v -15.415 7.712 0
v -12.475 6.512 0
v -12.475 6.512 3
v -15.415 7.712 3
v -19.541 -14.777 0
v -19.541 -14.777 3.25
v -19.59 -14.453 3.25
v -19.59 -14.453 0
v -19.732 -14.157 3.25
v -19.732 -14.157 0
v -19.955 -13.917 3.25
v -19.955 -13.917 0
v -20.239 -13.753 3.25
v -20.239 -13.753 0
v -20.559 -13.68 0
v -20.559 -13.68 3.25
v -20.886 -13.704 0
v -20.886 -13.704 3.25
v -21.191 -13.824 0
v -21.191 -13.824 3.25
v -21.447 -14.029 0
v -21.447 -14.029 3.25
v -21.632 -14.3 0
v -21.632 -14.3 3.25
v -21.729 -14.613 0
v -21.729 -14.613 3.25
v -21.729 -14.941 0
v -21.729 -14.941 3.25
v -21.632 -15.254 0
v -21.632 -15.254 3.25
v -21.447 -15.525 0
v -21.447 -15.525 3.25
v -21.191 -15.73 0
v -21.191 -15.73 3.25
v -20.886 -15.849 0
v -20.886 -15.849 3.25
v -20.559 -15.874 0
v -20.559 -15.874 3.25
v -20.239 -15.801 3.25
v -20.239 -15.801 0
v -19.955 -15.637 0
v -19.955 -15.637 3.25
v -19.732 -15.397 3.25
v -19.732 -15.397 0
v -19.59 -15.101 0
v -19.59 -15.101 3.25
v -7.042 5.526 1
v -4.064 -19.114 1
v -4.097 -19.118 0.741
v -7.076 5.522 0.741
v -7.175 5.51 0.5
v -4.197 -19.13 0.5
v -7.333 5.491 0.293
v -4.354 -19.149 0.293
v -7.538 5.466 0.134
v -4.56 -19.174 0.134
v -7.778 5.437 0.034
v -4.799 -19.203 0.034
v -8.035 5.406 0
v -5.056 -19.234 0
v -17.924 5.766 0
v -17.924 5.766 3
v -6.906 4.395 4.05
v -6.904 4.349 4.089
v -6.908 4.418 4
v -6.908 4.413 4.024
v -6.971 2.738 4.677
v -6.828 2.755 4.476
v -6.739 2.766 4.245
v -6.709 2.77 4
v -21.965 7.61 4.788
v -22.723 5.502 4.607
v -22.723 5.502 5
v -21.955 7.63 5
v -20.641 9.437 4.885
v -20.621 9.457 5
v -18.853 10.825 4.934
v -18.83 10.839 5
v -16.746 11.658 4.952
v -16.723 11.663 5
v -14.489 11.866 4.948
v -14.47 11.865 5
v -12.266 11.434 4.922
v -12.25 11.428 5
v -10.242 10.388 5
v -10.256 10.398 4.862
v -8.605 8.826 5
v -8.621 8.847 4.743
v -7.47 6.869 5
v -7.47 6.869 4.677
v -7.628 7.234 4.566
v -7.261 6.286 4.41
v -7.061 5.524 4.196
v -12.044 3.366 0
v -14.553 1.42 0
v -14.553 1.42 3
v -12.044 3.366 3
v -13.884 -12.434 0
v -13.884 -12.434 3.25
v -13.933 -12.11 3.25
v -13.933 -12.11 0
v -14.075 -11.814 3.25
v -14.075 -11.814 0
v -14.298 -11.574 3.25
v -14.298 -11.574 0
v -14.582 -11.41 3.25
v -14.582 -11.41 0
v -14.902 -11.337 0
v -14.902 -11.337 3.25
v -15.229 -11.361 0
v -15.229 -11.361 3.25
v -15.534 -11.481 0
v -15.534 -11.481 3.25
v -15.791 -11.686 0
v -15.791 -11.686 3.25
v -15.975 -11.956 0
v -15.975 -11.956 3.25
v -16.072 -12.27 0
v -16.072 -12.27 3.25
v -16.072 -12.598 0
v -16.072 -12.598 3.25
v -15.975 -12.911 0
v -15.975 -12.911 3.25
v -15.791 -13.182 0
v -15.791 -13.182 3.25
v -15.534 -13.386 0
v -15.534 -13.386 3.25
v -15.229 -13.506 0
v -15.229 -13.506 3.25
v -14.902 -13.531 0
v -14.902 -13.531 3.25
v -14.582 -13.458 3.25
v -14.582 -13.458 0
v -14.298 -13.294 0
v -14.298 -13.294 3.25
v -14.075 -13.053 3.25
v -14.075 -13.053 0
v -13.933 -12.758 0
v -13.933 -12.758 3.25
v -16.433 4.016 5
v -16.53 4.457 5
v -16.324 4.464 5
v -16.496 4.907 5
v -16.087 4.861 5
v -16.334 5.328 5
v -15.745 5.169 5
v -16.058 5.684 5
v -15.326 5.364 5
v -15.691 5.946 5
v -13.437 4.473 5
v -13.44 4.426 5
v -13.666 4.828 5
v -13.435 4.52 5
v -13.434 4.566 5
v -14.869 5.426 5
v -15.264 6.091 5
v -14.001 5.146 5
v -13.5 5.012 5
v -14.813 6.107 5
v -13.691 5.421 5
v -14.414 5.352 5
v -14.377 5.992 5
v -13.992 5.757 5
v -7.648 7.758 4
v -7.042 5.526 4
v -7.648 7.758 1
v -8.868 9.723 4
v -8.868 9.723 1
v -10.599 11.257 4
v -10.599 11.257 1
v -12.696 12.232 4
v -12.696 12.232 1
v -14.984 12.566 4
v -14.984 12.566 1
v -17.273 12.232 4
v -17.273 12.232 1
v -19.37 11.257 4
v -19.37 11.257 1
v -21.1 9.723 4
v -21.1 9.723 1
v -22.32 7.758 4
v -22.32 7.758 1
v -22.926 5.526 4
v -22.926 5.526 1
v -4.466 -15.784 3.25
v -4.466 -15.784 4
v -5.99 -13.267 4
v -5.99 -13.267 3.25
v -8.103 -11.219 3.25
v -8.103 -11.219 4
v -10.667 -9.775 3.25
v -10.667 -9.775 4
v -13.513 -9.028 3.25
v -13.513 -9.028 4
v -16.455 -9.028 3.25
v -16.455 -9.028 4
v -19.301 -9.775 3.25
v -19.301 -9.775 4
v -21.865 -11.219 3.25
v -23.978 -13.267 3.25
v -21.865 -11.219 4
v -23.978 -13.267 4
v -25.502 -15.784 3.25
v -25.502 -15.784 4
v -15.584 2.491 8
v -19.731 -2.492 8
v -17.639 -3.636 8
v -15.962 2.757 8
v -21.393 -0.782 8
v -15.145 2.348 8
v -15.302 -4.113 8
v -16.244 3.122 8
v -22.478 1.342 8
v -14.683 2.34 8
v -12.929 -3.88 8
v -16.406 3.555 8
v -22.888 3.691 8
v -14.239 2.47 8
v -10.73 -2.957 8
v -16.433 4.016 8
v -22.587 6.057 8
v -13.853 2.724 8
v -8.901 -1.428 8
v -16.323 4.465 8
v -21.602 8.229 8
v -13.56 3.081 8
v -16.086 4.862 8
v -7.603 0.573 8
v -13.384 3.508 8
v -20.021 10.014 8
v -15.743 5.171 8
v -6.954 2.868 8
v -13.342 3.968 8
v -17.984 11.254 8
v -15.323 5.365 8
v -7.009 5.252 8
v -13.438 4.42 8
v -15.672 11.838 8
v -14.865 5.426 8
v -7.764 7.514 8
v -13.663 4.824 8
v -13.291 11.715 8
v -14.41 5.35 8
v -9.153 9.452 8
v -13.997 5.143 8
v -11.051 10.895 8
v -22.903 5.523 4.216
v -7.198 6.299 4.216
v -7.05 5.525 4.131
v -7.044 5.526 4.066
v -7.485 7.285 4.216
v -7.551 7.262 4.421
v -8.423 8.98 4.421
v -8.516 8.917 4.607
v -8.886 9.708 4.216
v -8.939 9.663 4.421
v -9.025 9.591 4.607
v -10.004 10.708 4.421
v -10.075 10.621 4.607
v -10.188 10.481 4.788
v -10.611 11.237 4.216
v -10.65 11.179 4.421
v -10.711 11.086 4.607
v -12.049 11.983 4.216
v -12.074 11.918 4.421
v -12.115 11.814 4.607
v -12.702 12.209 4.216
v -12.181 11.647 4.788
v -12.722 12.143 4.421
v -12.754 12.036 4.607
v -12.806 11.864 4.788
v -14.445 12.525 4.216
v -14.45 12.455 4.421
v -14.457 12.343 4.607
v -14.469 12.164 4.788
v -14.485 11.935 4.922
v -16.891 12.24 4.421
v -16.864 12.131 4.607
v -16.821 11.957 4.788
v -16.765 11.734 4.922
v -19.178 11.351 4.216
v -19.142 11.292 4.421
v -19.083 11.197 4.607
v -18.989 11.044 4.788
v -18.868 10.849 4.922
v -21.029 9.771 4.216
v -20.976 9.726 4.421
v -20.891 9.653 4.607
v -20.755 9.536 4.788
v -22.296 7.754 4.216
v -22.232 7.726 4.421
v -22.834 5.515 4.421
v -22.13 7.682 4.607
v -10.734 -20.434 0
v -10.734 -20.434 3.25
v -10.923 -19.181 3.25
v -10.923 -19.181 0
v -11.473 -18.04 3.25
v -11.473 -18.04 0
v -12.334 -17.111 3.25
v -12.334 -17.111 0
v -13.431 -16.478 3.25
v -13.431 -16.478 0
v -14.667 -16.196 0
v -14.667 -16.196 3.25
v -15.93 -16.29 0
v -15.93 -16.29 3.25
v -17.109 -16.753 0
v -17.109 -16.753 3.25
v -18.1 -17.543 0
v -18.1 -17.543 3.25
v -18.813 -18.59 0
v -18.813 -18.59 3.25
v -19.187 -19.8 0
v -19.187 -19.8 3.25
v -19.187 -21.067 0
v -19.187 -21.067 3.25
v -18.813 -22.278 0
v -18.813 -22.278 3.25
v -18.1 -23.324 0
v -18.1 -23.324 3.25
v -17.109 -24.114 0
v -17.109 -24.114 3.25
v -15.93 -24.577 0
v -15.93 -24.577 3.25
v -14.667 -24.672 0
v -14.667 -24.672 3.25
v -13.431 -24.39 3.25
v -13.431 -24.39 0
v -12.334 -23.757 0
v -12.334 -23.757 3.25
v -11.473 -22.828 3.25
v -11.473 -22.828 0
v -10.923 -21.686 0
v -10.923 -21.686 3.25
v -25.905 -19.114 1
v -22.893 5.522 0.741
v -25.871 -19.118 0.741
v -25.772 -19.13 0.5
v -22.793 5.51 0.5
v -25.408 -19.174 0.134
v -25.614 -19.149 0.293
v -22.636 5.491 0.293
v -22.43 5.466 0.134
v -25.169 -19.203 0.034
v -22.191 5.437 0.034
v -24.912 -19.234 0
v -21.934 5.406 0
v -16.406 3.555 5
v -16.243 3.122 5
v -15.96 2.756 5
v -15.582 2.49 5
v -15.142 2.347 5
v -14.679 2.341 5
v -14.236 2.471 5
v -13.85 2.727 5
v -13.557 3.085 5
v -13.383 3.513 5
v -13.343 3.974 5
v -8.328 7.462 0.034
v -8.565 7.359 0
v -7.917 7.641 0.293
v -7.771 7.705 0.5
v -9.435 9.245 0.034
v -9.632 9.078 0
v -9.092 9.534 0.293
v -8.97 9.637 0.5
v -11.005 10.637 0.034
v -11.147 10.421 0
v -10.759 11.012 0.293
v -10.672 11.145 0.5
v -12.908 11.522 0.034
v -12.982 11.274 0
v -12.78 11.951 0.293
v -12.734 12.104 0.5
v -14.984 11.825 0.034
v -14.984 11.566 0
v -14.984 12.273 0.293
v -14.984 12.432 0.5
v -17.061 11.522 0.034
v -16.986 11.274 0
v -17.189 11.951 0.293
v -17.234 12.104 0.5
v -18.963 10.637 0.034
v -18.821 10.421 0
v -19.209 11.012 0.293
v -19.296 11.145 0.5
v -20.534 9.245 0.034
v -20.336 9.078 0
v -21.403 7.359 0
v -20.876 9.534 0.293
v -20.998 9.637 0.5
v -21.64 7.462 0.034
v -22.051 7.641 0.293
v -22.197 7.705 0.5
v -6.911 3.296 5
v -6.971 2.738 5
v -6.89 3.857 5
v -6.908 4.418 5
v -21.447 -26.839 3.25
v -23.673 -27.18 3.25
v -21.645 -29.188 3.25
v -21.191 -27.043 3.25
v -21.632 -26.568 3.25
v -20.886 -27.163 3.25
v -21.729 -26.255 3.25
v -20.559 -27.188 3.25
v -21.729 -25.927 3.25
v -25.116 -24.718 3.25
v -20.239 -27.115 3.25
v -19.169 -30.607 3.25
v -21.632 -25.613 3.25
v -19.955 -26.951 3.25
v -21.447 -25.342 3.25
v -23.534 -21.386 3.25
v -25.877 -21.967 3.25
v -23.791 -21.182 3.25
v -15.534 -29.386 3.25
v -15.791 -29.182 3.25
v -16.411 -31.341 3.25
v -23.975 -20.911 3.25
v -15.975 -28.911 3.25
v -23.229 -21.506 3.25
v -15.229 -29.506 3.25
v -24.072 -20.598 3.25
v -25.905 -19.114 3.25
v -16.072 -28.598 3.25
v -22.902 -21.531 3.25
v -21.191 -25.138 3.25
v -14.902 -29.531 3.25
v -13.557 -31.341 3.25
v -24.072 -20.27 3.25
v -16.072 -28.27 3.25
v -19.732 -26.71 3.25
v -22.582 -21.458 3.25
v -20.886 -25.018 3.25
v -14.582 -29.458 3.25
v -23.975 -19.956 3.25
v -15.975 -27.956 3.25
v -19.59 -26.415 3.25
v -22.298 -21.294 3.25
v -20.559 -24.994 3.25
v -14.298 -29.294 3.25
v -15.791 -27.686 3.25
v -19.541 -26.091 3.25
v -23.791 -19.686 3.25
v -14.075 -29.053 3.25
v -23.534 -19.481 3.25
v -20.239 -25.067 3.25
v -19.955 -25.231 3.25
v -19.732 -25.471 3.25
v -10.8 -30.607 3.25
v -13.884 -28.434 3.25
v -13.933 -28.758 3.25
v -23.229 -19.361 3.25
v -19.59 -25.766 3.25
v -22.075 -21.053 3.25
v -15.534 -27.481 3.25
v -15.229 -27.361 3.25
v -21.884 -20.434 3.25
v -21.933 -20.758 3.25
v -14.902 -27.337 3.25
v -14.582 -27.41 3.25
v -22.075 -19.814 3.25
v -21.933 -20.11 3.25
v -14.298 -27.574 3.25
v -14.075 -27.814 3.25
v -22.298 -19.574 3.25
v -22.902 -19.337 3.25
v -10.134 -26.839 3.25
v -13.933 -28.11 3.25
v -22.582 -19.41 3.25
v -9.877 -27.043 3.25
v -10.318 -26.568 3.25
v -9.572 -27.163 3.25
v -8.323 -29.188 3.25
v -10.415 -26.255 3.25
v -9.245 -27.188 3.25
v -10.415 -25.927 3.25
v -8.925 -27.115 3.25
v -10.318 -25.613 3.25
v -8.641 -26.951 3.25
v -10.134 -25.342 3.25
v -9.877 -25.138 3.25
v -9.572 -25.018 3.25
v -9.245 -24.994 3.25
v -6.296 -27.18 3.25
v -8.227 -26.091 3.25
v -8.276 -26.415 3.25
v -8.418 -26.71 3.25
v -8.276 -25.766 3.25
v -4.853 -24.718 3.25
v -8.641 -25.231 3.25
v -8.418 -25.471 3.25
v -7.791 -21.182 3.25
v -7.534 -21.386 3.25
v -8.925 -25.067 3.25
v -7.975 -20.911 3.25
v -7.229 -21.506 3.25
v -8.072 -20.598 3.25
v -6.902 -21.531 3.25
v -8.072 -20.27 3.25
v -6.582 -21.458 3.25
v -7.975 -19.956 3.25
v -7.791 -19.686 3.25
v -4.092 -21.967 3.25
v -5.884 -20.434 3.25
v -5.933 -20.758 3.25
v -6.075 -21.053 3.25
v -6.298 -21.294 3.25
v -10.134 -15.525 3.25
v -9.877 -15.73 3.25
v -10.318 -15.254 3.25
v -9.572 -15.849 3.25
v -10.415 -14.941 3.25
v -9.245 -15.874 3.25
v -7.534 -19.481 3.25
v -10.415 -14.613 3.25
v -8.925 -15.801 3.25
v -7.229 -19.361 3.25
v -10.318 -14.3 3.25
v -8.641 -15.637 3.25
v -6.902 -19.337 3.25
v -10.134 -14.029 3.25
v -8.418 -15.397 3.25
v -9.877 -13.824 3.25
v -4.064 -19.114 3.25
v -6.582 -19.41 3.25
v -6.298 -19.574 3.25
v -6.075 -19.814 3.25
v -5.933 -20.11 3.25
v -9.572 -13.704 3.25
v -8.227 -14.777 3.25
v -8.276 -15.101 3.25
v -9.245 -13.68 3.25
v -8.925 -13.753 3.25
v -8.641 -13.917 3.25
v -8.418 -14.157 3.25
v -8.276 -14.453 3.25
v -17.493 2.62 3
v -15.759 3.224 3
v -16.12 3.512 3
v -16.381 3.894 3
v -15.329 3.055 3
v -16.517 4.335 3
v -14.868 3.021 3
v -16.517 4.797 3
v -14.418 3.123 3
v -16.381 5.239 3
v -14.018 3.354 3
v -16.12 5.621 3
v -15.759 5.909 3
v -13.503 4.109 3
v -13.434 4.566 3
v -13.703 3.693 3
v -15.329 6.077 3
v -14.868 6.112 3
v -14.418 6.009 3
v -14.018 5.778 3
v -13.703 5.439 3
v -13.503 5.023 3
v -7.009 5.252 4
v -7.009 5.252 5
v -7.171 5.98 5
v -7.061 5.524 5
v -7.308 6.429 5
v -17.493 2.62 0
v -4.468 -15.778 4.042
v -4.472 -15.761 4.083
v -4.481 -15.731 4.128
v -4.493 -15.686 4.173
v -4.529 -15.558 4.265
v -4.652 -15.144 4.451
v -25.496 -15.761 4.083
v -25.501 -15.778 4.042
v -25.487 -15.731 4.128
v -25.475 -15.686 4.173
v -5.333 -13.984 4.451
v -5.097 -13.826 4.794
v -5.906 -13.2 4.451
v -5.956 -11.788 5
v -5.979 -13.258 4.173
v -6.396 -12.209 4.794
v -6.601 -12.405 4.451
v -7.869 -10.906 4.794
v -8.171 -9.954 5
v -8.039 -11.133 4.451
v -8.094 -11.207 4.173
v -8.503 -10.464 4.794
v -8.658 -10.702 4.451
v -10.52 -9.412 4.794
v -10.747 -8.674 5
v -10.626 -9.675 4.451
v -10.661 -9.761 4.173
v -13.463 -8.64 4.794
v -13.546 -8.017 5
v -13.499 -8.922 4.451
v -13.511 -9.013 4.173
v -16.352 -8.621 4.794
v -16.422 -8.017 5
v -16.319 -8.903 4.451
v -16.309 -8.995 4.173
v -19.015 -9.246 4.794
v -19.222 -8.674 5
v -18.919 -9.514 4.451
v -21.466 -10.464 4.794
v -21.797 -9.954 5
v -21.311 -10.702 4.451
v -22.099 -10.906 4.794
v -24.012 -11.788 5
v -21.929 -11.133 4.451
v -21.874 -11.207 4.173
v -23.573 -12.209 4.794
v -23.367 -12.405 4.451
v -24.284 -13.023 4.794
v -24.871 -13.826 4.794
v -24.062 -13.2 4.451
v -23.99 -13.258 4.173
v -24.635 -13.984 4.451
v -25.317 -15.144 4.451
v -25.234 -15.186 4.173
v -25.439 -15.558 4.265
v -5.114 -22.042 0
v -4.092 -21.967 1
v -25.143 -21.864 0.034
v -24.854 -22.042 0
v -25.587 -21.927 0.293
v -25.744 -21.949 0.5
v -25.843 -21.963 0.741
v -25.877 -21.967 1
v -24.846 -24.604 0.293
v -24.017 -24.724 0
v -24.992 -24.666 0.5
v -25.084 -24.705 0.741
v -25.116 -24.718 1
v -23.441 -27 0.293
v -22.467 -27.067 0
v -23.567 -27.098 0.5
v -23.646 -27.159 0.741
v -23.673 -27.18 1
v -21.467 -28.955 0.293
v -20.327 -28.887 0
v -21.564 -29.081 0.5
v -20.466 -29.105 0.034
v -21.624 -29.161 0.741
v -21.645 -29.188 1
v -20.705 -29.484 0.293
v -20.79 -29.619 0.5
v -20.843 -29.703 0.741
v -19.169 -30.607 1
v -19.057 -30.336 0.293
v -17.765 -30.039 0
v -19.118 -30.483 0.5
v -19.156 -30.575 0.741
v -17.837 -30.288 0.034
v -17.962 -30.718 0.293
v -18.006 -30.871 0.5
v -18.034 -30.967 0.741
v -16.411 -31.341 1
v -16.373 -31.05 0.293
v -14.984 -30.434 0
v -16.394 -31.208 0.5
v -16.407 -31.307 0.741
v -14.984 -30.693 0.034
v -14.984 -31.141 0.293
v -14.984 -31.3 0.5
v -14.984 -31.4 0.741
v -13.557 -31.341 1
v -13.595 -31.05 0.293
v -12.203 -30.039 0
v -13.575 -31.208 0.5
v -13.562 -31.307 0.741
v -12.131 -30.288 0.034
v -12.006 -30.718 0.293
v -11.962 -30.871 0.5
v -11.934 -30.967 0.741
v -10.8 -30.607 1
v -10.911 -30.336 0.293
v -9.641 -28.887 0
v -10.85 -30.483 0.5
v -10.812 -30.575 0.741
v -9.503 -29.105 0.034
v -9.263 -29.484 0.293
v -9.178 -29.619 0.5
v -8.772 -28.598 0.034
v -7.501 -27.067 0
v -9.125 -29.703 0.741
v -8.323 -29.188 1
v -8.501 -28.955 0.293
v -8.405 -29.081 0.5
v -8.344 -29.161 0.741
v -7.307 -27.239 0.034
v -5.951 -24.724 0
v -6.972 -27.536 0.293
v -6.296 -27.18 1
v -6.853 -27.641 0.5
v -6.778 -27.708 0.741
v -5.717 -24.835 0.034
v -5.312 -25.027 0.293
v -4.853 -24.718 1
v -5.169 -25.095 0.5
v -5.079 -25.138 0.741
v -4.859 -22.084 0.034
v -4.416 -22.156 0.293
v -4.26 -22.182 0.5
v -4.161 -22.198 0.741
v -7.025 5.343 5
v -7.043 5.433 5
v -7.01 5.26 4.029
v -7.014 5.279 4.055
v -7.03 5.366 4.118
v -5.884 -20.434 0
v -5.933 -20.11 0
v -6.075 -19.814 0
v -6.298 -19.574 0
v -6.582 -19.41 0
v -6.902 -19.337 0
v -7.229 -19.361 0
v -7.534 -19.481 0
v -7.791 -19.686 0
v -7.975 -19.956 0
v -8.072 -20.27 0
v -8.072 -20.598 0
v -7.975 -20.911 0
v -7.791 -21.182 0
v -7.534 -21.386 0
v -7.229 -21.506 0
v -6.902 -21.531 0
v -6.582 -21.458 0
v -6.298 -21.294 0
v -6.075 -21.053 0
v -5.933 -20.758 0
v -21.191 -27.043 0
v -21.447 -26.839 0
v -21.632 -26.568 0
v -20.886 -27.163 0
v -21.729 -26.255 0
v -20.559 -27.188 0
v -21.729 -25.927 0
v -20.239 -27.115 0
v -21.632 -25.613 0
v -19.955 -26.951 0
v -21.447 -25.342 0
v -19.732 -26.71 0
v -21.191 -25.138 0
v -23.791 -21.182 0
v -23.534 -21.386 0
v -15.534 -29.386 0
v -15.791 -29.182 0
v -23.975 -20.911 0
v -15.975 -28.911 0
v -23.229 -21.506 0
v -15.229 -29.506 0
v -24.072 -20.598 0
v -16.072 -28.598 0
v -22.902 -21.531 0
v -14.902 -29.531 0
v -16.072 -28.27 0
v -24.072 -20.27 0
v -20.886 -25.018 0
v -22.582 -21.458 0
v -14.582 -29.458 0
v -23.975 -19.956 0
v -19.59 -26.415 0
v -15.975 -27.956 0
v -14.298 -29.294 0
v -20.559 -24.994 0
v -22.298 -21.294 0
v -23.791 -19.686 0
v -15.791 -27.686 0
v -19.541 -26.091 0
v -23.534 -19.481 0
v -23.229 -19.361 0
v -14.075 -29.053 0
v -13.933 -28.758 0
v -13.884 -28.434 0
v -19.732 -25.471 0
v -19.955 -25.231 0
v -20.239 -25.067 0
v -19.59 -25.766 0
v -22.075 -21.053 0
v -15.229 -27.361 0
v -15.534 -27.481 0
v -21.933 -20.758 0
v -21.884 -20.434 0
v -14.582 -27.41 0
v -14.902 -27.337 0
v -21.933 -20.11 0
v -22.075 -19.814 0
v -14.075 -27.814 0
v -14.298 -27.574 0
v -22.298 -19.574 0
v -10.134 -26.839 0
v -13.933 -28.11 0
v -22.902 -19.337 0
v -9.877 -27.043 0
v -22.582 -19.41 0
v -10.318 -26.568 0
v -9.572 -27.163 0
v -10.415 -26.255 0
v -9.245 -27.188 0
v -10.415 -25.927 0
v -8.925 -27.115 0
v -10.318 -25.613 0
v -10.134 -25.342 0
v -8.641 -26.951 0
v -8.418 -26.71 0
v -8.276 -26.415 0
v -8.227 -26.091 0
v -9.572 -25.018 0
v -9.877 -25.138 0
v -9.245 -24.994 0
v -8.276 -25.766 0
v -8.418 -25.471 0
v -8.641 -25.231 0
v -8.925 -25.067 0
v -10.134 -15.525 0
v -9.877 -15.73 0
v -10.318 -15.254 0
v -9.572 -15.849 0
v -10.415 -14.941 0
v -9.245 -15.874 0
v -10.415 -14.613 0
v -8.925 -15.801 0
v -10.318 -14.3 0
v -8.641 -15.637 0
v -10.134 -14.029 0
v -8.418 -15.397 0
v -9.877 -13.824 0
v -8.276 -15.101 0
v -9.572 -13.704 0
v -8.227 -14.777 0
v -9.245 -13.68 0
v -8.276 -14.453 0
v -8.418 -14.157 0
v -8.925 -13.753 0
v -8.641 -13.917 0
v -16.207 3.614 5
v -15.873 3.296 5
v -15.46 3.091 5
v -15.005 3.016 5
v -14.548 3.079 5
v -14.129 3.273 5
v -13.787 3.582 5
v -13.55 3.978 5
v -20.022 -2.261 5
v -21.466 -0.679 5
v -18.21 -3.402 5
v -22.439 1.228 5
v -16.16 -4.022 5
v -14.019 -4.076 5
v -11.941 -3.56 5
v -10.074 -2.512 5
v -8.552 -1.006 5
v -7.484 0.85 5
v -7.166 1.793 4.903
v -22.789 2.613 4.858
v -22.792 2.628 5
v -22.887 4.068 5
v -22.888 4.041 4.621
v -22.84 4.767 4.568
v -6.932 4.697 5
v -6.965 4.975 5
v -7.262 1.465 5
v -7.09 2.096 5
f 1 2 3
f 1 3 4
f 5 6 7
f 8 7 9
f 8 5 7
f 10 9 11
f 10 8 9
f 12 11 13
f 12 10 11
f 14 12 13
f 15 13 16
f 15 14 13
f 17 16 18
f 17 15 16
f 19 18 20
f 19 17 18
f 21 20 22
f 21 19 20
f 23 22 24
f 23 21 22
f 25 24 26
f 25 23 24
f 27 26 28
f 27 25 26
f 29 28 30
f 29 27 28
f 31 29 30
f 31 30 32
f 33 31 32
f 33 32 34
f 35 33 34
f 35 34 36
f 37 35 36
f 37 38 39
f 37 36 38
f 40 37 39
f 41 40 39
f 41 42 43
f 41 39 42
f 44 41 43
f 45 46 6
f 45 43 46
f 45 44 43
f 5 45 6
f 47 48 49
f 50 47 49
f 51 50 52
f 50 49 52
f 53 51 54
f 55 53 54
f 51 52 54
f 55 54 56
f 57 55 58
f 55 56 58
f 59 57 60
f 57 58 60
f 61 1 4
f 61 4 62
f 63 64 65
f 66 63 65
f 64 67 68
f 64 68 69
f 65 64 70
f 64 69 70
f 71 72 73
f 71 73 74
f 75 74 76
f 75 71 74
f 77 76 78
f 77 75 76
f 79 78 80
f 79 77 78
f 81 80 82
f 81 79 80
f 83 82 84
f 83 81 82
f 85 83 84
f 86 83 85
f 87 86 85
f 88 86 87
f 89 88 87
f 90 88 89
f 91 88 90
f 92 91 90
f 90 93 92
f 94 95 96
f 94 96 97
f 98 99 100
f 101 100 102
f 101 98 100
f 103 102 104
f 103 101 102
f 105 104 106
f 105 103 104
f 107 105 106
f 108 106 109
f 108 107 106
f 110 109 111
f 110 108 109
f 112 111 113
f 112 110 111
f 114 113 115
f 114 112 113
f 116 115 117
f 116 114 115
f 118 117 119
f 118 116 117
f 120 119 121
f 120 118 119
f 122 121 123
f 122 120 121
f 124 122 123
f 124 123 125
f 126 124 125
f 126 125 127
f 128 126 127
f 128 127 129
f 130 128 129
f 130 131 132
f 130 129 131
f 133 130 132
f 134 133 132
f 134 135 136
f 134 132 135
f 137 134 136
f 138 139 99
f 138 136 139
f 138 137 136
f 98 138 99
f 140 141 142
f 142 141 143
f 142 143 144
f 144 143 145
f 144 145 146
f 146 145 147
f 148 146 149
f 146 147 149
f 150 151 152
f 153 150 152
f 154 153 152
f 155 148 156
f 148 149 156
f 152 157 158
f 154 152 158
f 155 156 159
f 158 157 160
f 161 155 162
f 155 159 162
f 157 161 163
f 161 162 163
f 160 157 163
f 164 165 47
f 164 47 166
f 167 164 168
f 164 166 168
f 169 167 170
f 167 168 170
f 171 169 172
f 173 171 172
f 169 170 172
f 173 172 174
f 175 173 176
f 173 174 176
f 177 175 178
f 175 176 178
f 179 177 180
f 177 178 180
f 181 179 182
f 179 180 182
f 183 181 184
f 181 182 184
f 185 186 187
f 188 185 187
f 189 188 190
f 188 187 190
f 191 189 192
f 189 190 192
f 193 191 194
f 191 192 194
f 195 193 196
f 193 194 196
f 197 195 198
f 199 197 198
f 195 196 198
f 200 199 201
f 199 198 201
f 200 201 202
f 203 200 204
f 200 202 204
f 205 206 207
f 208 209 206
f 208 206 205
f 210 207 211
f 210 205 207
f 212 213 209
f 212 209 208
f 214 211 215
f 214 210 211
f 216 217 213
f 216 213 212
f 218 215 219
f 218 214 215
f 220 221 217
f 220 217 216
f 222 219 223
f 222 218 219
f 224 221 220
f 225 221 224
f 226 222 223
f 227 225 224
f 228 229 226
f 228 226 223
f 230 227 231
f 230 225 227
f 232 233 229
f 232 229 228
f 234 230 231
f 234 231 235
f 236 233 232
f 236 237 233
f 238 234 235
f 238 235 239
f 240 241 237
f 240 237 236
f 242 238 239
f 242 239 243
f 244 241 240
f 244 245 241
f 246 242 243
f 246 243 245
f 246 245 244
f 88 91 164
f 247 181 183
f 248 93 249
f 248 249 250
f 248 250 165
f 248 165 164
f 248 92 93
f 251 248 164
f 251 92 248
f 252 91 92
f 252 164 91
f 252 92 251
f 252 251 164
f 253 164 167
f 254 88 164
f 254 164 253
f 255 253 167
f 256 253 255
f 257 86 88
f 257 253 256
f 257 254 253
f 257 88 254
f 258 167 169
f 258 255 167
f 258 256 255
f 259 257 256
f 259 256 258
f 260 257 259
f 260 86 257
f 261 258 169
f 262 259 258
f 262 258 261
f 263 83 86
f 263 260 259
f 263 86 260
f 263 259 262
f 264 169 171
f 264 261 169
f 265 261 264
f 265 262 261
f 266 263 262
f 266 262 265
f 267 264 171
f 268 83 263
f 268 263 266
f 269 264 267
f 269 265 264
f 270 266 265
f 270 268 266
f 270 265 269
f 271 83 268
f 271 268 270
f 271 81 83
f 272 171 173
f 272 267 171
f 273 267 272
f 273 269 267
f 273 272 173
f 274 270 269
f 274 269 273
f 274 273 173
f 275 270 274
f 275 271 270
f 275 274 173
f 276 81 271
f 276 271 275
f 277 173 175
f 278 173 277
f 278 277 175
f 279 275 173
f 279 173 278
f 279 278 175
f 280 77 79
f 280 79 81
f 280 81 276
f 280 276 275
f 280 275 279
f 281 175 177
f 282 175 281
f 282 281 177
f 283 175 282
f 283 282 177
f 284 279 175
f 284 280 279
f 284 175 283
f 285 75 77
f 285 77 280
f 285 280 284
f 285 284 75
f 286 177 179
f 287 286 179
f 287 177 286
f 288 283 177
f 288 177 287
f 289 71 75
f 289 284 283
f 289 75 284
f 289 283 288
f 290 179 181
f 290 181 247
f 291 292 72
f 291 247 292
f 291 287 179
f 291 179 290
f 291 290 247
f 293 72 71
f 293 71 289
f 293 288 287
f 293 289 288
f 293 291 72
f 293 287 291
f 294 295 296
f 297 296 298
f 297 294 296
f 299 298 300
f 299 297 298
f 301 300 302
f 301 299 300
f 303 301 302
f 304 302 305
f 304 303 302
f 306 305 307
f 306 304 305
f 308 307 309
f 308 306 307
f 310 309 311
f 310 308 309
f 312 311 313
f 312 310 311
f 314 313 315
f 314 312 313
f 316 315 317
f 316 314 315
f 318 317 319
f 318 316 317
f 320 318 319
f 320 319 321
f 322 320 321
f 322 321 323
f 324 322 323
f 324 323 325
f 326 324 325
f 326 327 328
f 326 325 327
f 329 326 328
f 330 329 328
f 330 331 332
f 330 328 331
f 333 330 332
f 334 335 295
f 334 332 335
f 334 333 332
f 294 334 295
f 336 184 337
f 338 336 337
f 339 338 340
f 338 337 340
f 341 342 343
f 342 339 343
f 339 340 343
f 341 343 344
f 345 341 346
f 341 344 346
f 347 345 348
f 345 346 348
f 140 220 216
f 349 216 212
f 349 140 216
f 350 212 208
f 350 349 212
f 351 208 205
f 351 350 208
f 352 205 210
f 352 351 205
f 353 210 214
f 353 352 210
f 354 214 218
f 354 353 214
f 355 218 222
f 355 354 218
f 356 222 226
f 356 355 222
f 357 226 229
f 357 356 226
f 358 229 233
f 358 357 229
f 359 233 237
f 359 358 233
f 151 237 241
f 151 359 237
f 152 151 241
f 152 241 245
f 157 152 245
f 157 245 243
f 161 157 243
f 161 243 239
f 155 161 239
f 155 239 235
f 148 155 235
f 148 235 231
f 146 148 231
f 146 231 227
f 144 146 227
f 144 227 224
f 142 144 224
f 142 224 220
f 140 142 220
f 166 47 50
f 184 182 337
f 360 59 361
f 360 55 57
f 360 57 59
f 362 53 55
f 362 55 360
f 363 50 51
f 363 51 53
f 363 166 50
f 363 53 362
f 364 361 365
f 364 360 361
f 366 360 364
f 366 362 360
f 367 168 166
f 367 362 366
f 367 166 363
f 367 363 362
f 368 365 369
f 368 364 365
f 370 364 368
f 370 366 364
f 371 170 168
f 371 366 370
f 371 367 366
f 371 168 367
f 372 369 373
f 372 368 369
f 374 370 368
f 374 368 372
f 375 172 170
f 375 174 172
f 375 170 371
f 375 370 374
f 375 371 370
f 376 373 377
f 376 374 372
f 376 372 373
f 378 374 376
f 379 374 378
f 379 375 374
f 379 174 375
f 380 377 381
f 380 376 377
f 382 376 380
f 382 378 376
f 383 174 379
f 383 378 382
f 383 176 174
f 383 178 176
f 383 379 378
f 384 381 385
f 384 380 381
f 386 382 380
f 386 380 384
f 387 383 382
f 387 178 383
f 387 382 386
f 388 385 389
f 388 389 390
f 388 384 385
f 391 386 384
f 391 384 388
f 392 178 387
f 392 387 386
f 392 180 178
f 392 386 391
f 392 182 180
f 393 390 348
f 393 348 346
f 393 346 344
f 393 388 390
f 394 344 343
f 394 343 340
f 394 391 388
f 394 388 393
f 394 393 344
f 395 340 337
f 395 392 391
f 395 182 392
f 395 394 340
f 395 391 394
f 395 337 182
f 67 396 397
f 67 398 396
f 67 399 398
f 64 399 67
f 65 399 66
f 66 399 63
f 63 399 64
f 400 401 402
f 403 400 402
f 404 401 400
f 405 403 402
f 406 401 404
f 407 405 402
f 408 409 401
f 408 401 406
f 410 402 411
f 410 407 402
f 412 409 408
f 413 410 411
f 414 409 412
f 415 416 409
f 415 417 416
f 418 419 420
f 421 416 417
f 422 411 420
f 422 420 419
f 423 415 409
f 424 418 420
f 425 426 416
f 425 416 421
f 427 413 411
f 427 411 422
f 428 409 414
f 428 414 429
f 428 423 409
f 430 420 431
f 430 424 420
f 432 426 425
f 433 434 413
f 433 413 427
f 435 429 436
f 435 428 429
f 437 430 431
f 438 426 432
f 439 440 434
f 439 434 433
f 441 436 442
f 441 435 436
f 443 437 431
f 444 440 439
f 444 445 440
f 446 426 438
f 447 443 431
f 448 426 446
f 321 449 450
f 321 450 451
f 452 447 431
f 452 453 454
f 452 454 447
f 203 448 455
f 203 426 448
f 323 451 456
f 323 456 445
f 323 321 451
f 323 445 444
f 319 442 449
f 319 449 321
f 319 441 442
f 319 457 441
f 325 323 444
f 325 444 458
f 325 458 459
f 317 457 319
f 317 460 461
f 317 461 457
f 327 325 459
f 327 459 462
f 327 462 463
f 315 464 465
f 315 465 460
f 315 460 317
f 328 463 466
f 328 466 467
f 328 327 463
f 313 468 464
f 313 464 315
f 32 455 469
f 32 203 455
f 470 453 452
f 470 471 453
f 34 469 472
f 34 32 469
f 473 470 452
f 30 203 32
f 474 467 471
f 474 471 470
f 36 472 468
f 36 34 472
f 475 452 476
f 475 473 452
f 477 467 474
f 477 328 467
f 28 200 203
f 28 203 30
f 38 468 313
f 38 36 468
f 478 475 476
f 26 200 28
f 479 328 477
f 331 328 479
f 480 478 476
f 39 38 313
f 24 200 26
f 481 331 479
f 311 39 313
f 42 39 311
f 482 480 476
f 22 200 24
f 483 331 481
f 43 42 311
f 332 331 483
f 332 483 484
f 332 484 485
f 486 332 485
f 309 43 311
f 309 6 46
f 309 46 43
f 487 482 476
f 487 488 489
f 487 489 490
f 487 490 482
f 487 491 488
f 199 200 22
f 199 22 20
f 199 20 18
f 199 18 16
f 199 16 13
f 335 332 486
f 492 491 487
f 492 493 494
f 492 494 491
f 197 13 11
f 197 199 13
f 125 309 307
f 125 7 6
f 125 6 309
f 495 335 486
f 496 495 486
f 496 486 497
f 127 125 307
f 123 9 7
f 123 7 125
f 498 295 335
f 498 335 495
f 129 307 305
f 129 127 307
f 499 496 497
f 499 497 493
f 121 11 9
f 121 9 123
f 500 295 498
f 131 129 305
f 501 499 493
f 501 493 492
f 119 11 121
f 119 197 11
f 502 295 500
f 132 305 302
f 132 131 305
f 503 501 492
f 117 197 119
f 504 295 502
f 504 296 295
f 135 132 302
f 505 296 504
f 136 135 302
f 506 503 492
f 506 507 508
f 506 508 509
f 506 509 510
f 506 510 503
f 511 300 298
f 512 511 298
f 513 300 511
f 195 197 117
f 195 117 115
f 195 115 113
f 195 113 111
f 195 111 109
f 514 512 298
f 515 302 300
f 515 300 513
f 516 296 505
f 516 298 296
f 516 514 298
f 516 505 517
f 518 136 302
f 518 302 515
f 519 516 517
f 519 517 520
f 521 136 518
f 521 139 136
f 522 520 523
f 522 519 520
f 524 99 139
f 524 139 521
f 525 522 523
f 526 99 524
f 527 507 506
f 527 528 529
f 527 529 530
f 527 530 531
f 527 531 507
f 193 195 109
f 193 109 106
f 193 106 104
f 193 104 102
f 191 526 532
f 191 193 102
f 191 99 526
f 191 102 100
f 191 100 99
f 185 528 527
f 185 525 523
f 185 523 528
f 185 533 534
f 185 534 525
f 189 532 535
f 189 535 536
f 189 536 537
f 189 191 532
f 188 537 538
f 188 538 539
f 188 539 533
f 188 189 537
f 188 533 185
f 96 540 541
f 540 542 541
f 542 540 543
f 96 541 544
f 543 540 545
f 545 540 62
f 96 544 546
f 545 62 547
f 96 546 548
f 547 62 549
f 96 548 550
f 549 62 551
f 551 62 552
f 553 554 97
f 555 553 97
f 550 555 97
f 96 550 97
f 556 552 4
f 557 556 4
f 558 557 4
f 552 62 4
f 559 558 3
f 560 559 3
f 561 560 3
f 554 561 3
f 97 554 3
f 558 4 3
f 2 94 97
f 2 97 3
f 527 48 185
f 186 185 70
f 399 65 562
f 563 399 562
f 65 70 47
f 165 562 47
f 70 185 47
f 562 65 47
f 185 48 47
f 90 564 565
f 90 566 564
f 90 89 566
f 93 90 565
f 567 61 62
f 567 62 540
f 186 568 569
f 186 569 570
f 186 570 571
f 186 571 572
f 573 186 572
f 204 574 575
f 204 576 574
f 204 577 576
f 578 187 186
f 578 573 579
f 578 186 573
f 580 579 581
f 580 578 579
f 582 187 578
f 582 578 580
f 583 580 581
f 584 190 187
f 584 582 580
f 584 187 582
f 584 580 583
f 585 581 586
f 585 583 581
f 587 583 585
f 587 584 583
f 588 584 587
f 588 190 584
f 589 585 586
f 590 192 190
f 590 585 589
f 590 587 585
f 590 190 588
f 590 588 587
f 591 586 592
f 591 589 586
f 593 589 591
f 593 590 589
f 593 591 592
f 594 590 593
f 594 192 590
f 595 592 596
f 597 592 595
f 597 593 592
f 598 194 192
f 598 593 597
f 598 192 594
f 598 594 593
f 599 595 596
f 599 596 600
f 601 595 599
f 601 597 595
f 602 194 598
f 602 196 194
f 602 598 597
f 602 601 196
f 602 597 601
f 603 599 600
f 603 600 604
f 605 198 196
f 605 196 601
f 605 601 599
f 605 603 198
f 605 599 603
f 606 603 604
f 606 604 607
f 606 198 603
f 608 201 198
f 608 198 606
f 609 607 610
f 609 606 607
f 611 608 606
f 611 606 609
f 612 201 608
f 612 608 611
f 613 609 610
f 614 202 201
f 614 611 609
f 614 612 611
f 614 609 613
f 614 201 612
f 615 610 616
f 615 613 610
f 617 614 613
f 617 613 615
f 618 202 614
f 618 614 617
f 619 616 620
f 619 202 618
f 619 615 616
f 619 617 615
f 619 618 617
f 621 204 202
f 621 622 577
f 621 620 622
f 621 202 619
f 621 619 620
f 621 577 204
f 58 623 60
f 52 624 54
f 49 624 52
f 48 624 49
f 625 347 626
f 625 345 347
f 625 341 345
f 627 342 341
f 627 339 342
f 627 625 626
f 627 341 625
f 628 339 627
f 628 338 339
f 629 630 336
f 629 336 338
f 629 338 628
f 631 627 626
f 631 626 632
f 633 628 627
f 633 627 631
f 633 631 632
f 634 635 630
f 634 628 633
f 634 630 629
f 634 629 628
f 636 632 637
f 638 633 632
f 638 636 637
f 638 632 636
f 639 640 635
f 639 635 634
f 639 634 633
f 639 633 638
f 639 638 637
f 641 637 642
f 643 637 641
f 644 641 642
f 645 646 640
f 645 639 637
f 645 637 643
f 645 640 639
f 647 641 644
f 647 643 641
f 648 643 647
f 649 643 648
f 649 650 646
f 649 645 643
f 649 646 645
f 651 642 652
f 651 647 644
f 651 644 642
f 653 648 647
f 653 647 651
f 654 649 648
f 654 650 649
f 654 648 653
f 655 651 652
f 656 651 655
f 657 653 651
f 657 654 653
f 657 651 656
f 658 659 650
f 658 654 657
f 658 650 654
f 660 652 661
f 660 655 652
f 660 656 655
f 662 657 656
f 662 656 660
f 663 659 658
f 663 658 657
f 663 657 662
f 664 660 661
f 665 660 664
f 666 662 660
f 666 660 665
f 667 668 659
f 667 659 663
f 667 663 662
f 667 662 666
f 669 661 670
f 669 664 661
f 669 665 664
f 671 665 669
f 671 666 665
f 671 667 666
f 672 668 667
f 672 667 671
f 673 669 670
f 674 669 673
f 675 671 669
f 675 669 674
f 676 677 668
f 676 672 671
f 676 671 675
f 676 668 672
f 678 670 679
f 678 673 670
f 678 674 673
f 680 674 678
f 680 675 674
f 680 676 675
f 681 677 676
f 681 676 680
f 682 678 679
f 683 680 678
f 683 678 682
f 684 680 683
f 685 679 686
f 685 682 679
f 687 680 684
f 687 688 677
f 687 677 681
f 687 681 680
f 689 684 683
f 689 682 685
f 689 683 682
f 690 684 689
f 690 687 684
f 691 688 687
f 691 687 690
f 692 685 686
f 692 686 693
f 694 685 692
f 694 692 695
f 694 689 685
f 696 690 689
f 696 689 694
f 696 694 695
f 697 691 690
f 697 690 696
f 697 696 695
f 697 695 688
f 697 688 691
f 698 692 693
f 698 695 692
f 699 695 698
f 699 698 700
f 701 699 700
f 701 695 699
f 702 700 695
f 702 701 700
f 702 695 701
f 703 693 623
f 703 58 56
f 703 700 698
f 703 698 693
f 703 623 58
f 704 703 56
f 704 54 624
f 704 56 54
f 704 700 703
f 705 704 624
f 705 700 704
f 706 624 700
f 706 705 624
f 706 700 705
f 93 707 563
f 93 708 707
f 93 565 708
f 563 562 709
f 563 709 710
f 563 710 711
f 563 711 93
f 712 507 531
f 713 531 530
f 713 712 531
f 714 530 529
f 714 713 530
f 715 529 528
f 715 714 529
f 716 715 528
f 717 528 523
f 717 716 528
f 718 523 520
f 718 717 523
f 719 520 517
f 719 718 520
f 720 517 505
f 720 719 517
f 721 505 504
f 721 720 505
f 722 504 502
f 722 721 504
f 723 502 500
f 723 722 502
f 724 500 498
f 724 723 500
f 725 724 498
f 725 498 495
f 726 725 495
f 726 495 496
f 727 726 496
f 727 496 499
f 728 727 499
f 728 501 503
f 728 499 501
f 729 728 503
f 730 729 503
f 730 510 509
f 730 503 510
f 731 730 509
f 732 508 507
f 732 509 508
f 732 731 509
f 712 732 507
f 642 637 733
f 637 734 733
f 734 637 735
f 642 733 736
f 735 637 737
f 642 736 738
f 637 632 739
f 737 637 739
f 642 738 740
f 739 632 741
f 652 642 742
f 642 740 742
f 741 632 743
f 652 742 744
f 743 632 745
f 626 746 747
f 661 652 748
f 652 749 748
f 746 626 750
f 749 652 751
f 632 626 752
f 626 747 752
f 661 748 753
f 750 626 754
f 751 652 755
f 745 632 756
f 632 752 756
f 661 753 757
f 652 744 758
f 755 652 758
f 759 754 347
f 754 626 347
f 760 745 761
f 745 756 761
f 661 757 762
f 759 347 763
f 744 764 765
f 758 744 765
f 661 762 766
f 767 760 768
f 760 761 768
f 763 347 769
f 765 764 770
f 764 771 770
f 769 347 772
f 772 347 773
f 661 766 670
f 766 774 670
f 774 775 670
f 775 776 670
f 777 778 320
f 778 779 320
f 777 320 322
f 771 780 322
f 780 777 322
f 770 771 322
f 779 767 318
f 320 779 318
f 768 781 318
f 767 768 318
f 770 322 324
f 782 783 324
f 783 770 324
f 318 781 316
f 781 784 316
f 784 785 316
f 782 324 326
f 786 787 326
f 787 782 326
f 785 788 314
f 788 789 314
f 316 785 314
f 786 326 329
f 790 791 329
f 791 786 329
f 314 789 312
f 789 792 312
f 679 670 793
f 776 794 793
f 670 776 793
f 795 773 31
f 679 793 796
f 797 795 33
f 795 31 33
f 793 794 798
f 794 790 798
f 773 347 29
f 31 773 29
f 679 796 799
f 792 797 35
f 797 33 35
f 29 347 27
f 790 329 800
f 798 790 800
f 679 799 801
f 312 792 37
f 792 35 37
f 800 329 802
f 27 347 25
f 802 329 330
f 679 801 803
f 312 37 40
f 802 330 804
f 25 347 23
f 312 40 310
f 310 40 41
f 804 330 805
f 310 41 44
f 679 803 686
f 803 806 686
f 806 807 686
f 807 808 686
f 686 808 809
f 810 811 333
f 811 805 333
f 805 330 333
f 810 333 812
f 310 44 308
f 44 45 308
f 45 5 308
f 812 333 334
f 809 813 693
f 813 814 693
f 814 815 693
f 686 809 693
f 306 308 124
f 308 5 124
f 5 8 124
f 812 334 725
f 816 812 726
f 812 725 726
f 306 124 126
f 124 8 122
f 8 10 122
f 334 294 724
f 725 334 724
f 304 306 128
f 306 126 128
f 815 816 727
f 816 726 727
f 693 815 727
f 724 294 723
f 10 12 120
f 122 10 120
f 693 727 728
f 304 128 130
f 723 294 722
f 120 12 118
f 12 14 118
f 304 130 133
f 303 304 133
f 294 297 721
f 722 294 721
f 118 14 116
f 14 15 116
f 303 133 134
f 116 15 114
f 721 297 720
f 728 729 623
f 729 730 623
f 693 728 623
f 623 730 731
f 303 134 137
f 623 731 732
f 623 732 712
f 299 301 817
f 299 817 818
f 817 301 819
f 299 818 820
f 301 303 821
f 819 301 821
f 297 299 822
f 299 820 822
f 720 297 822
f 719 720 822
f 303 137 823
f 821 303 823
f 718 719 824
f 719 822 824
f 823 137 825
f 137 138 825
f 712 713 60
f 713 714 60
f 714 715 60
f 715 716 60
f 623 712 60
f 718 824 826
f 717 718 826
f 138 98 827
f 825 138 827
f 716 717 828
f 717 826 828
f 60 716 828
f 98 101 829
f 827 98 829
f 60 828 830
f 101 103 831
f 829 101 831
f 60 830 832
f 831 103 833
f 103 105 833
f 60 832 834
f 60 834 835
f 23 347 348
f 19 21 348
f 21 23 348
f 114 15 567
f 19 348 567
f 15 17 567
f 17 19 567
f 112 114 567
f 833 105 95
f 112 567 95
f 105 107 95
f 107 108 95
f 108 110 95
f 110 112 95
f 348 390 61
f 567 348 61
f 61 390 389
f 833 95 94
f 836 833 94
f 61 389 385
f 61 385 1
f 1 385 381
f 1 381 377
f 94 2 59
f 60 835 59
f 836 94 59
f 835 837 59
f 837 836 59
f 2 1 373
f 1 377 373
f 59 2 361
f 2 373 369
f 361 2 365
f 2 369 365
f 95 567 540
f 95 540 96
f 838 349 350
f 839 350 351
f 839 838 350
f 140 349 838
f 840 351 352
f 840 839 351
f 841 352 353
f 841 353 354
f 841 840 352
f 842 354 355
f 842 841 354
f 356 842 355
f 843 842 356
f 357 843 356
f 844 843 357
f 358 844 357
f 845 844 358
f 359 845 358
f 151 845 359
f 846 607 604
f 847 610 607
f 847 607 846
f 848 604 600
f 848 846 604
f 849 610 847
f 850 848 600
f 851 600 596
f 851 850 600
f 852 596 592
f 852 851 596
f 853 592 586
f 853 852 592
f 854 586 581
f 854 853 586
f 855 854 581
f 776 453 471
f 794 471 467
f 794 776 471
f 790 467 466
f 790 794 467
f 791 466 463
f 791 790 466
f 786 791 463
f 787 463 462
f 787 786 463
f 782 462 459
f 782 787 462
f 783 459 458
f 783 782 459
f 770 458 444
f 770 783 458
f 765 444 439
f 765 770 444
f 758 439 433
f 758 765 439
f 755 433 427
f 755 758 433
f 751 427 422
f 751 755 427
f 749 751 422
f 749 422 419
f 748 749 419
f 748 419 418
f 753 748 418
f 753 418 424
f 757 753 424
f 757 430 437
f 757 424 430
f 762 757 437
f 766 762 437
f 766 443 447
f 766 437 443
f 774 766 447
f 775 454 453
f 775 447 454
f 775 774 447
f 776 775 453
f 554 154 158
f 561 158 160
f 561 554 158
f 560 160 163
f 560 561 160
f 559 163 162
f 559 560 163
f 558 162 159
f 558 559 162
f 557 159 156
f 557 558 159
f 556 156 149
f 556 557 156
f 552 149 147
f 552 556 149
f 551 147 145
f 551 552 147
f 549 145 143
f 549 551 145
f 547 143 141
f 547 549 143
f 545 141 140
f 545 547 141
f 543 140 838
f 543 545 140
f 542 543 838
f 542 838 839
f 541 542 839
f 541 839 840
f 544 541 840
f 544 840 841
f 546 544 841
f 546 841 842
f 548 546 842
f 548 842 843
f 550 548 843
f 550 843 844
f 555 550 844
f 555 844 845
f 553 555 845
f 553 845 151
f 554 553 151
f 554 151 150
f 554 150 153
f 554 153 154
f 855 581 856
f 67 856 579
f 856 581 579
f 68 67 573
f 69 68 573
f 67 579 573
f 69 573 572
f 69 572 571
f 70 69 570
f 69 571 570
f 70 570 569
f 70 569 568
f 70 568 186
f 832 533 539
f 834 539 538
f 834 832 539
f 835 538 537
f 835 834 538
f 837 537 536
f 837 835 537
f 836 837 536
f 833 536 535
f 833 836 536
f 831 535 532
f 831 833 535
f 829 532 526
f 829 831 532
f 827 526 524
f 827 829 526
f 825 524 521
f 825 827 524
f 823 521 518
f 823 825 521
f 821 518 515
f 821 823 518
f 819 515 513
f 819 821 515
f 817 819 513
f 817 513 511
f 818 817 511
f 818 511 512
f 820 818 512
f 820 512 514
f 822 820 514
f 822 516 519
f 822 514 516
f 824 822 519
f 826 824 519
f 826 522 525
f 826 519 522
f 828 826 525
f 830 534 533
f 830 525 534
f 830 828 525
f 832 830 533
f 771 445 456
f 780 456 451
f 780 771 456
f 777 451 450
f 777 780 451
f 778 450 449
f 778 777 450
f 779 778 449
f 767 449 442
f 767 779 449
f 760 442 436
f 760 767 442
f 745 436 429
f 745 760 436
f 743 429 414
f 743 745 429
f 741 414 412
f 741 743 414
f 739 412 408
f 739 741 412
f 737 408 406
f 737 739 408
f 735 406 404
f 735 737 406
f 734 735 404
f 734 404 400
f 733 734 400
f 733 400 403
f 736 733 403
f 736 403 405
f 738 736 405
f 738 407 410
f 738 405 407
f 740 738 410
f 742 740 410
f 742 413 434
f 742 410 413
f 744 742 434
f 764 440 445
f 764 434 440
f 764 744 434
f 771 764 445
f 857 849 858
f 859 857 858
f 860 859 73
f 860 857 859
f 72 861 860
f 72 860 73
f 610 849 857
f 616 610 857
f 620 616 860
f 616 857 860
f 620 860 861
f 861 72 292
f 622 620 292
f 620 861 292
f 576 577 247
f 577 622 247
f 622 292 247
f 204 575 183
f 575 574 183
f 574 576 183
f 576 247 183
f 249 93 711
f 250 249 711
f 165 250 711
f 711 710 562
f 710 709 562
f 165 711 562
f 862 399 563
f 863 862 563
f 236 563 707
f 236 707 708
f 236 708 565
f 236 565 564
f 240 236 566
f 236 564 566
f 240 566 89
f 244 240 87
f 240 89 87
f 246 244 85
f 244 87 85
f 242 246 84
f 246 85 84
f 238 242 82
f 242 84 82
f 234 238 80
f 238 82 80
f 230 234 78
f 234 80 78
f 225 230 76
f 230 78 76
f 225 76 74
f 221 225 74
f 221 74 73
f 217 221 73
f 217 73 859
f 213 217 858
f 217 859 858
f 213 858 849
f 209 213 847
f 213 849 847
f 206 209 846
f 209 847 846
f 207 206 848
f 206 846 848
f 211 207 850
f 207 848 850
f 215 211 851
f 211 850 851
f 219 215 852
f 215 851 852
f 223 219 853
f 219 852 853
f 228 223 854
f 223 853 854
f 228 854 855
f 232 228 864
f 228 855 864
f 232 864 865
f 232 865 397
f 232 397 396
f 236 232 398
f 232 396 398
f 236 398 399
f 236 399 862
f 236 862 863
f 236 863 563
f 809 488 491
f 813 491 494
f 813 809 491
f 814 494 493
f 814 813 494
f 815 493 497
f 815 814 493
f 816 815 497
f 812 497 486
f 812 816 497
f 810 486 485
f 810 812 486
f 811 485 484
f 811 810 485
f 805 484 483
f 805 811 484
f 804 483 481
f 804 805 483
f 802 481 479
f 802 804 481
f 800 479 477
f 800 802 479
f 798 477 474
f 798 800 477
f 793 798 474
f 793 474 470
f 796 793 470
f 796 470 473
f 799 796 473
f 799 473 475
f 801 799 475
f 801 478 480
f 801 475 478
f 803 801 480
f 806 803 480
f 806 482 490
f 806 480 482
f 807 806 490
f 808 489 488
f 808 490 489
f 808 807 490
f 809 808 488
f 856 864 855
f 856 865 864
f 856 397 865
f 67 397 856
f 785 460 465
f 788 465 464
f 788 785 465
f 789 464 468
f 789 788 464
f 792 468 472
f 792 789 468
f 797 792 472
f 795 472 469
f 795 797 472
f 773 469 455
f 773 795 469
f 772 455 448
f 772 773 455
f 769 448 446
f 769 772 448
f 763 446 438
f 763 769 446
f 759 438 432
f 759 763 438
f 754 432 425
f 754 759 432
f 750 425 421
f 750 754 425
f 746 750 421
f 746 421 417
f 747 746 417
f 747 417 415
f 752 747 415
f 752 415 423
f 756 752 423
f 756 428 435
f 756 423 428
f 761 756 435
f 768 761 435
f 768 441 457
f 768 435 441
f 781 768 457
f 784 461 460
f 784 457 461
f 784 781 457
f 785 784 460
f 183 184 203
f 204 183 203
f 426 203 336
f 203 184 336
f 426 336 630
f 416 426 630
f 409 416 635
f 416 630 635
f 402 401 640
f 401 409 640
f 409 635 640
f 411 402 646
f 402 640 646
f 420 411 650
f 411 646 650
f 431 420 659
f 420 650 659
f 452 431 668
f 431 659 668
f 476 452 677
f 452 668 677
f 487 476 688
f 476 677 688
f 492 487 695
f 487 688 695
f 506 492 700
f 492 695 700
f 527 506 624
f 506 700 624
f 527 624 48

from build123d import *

# Parameters (mm, degrees)
SKETCH1_R           = 1.55
SKETCH1_R_2         = 4.25
SKETCH1_R_3         = 1.1
BOSS_EXTRUDE1_DEPTH = 5
SKETCH2_R           = 11.5
CUT_EXTRUDE1_DEPTH  = 1.75
CUT_EXTRUDE2_DEPTH  = 3
SKETCH5_R           = 8
SKETCH5_R_2         = 1.55
BOSS_EXTRUDE2_DEPTH = 3
FILLET1_R           = 1


with BuildPart() as part:
    # Sketch1 → Boss-Extrude1 (new body)
    with BuildSketch(Plane.XY):
        with BuildLine():
            Line((-22.926334266, 5.526262294), (-25.904655941, -19.113737706))
            ThreePointArc((-25.904655941, -19.113737706), (-14.984143133, -31.433737706), (-4.063630324, -19.113737706))
            Line((-4.063630324, -19.113737706), (-7.041951999, 5.526262294))
            ThreePointArc((-7.041951999, 5.526262294), (-14.984143133, 12.566262294), (-22.926334266, 5.526262294))
        make_face()
        with Locations((-14.984143133, 4.566262294)):
            Circle(SKETCH1_R, mode=Mode.SUBTRACT)
        with Locations((-14.984143133, -20.433737706)):
            Circle(SKETCH1_R_2, mode=Mode.SUBTRACT)
        with Locations((-6.984143133, -20.433737706)):
            Circle(SKETCH1_R_3, mode=Mode.SUBTRACT)
        with Locations((-9.327288883, -26.090591955)):
            Circle(SKETCH1_R_3, mode=Mode.SUBTRACT)
        with Locations((-14.984143133, -28.433737706)):
            Circle(SKETCH1_R_3, mode=Mode.SUBTRACT)
        with Locations((-20.640997382, -26.090591955)):
            Circle(SKETCH1_R_3, mode=Mode.SUBTRACT)
        with Locations((-22.984143133, -20.433737706)):
            Circle(SKETCH1_R_3, mode=Mode.SUBTRACT)
        with Locations((-20.640997382, -14.776883456)):
            Circle(SKETCH1_R_3, mode=Mode.SUBTRACT)
        with Locations((-14.984143133, -12.433737706)):
            Circle(SKETCH1_R_3, mode=Mode.SUBTRACT)
        with Locations((-9.327288883, -14.776883456)):
            Circle(SKETCH1_R_3, mode=Mode.SUBTRACT)
    extrude(amount=BOSS_EXTRUDE1_DEPTH)

    # Sketch2 → Cut-Extrude1 (cut)
    with BuildSketch(Plane.XY.offset(5)):
        with Locations((-14.984143133, -20.433737706)):
            Circle(SKETCH2_R)
    extrude(amount=-CUT_EXTRUDE1_DEPTH, mode=Mode.SUBTRACT)

    # Sketch3 → Cut-Extrude2 (cut)
    with BuildSketch(Plane.XY):
        Polygon((-15.415032752, 7.712318154), (-17.924152238, 5.766128868), (-17.493262619, 2.620073008), (-14.553253513, 1.420206435), (-12.044134027, 3.366395721), (-12.475023646, 6.512451581), align=None)
    extrude(amount=CUT_EXTRUDE2_DEPTH, mode=Mode.SUBTRACT)

    # Sketch5 → Boss-Extrude2 (add)
    with BuildSketch(Plane.XY.offset(5)):
        with Locations(Location((-14.88966218, 3.876428191, 0), (0, 0, 9.899538967))):
            Circle(SKETCH5_R)
        with Locations(Location((-14.88966218, 3.876428191, 0), (0, 0, 174.819185621))):
            Circle(SKETCH5_R_2, mode=Mode.SUBTRACT)
    extrude(amount=BOSS_EXTRUDE2_DEPTH)

    # Fillet1
    # the kernel refuses this fillet: 1 mm, written as the material it takes off along each edge
    with BuildSketch(Plane(origin=(-4.063630324, -19.113737706, 0), x_dir=(-0.9927738916792687, -0.11999999999999997, 0), z_dir=(-0.11999999999999997, 0.9927738916792685, 0))) as fillet1_piece_1:
        with BuildLine():
            CenterArc((FILLET1_R, FILLET1_R), FILLET1_R, 180, 90)
            Line((0, FILLET1_R), (0, 0))
            Line((0, 0), (FILLET1_R, 0))
        make_face()
    extrude(amount=24.819347292, mode=Mode.SUBTRACT)
    with BuildSketch(Plane(origin=(-14.984143133, -20.433737706, 0), x_dir=(-0.9927738916792687, 0.1199999999999997, 0), z_dir=(0.1199999999999997, 0.9927738916792687, 0))) as fillet1_piece_2:
        with BuildLine():
            CenterArc((11 - FILLET1_R, FILLET1_R), FILLET1_R, 270, 90)
            Line((11, FILLET1_R), (11, 0))
            Line((11, 0), (11 - FILLET1_R, 0))
        make_face()
    revolve(axis=Axis((-14.984143133, -20.433737706, 0), (0, 0, 1)), revolution_arc=193.784205159, mode=Mode.SUBTRACT)
    with BuildSketch(Plane(origin=(-14.984143133, -20.433737706, 5), x_dir=(0.980329402644487, 0.19736834171341458, 0), z_dir=(0.19736834171341458, -0.980329402644487, 0))) as fillet1_piece_3:
        with BuildLine():
            CenterArc((11.5 + FILLET1_R, -FILLET1_R), FILLET1_R, 90, 90)
            Line((11.5 + FILLET1_R, 0), (11.5, 0))
            Line((11.5, 0), (11.5, -FILLET1_R))
        make_face()
    revolve(axis=Axis((-14.984143133, -20.433737706, 5), (0, 0, 1)), revolution_arc=157.233782309, mode=Mode.SUBTRACT)
    with BuildSketch(Plane(origin=(-14.984143133, 4.566262294, 0), x_dir=(0.9927738916792685, 0.12000000000000052, 0), z_dir=(0.12000000000000052, -0.9927738916792685, 0))) as fillet1_piece_4:
        with BuildLine():
            CenterArc((8 - FILLET1_R, FILLET1_R), FILLET1_R, 270, 90)
            Line((8, FILLET1_R), (8, 0))
            Line((8, 0), (8 - FILLET1_R, 0))
        make_face()
    revolve(axis=Axis((-14.984143133, 4.566262294, 0), (0, 0, 1)), revolution_arc=166.215794841, mode=Mode.SUBTRACT)
    with BuildSketch(Plane(origin=(-22.926334266, 5.526262294, 0), x_dir=(0, 0, 1), z_dir=(-0.11999999999999994, -0.9927738916792685, 0))) as fillet1_piece_5:
        with BuildLine():
            CenterArc((FILLET1_R, -FILLET1_R), FILLET1_R, 90, 90)
            Line((0, -FILLET1_R), (0, 0))
            Line((0, 0), (FILLET1_R, 0))
        make_face()
    extrude(amount=24.819347292, mode=Mode.SUBTRACT)
    with BuildSketch(Plane(origin=(-4.16612256, -18.265807573, 5), x_dir=(-0.9927738916792687, -0.11999999999999998, 0), z_dir=(-0.11999999999999997, 0.9927738916792685, 0))) as fillet1_piece_6_section:
        with BuildLine():
            CenterArc((FILLET1_R, -FILLET1_R), FILLET1_R, 90, 90)
            Line((0, -FILLET1_R), (0, 0))
            Line((0, 0), (FILLET1_R, 0))
        make_face()
    fillet1_piece_6 = extrude(amount=25.349333785, mode=Mode.PRIVATE)
    fillet1_piece_6 = fillet1_piece_6 - Plane(origin=(-14.88966218, 3.876428191, 4.768901456), x_dir=(0.9851107095579202, 0.17192117354849282, 0), z_dir=(0, 0, -1)) * Cylinder(8, 55, mode=Mode.PRIVATE)
    add(fillet1_piece_6, mode=Mode.SUBTRACT)
    with BuildSketch(Plane(origin=(-6.708776504, 2.76986285, 5), x_dir=(-0.9927738916792687, -0.11999999999999998, 0), z_dir=(-0.11999999999999997, 0.9927738916792685, 0))) as fillet1_piece_7_section:
        with BuildLine():
            CenterArc((FILLET1_R, -FILLET1_R), FILLET1_R, 90, 90)
            Line((0, -FILLET1_R), (0, 0))
            Line((0, 0), (FILLET1_R, 0))
        make_face()
    fillet1_piece_7 = extrude(amount=2.776462463, mode=Mode.PRIVATE)
    fillet1_piece_7 = fillet1_piece_7 - Plane(origin=(-14.88966218, 3.876428191, 4.554846091), x_dir=(0.9851107095579202, 0.17192117354849282, 0), z_dir=(0, 0, -1)) * Cylinder(8, 10, mode=Mode.PRIVATE)
    add(fillet1_piece_7, mode=Mode.SUBTRACT)
    with BuildSketch(Plane(origin=(-22.926334266, 5.526262294, 5), x_dir=(0, 0, -1), z_dir=(-0.11999999999999994, -0.9927738916792685, 0))) as fillet1_piece_8_section:
        with BuildLine():
            CenterArc((FILLET1_R, FILLET1_R), FILLET1_R, 180, 90)
            Line((0, FILLET1_R), (0, 0))
            Line((0, 0), (FILLET1_R, 0))
        make_face()
    fillet1_piece_8 = extrude(amount=23.965245326, mode=Mode.PRIVATE)
    fillet1_piece_8 = fillet1_piece_8 - Plane(origin=(-14.88966218, 3.876428191, 4.768639771), x_dir=(0.9851107095579202, 0.17192117354849282, 0), z_dir=(0, 0, -1)) * Cylinder(8, 52, mode=Mode.PRIVATE)
    add(fillet1_piece_8, mode=Mode.SUBTRACT)
    with BuildSketch(Plane(origin=(-14.984143133, 4.566262294, 5), x_dir=(0.9927738916792685, 0.12000000000000052, 0), z_dir=(0.12000000000000052, -0.9927738916792685, 0))) as fillet1_piece_9_section:
        with BuildLine():
            CenterArc((8 - FILLET1_R, -FILLET1_R), FILLET1_R, 0, 90)
            Line((8, -FILLET1_R), (8, 0))
            Line((8, 0), (8 - FILLET1_R, 0))
        make_face()
    fillet1_piece_9 = revolve(axis=Axis((-14.984143133, 4.566262294, 5), (0, 0, 1)), revolution_arc=166.215794841, mode=Mode.PRIVATE)
    fillet1_piece_9 = fillet1_piece_9 - Plane(origin=(-14.88966218, 3.876428191, 4.59944893), x_dir=(0.9851107095579202, 0.17192117354849282, 0), z_dir=(0, 0, -1)) * Cylinder(8, 33, mode=Mode.PRIVATE)
    add(fillet1_piece_9, mode=Mode.SUBTRACT)


solid = part.part
